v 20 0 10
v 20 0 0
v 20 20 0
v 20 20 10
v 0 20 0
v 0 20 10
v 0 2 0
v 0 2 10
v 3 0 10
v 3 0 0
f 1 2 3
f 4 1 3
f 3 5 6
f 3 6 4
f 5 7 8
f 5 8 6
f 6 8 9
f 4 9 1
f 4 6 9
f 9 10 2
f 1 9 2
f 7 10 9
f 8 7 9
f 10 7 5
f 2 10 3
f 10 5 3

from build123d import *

# Parameters (mm, degrees)
SKETCH_1_W                    = 20
SKETCH_1_H                    = 20
BASEBOX_DEPTH                 = 10
CHAMFERDISTANCEDISTANCE_SIZE  = 2
CHAMFERDISTANCEDISTANCE_SIZE2 = 3


with BuildPart() as part:
    # 草图1 → BaseBox (new body)
    with BuildSketch(Plane.XY):
        with Locations((10, 10)):
            Rectangle(SKETCH_1_W, SKETCH_1_H)
    extrude(amount=BASEBOX_DEPTH)

    # ChamferDistanceDistance
    chamferdistancedistance_edges = [part.edges().sort_by_distance(p)[0] for p in [
        (0, 0, 5),
    ]]
    chamferdistancedistance_side = [part.faces().sort_by_distance(p)[0] for p in [
        (0, 10, 5),
    ]]
    chamfer(chamferdistancedistance_edges, length=CHAMFERDISTANCEDISTANCE_SIZE, length2=CHAMFERDISTANCEDISTANCE_SIZE2, reference=chamferdistancedistance_side[0])


solid = part.part
